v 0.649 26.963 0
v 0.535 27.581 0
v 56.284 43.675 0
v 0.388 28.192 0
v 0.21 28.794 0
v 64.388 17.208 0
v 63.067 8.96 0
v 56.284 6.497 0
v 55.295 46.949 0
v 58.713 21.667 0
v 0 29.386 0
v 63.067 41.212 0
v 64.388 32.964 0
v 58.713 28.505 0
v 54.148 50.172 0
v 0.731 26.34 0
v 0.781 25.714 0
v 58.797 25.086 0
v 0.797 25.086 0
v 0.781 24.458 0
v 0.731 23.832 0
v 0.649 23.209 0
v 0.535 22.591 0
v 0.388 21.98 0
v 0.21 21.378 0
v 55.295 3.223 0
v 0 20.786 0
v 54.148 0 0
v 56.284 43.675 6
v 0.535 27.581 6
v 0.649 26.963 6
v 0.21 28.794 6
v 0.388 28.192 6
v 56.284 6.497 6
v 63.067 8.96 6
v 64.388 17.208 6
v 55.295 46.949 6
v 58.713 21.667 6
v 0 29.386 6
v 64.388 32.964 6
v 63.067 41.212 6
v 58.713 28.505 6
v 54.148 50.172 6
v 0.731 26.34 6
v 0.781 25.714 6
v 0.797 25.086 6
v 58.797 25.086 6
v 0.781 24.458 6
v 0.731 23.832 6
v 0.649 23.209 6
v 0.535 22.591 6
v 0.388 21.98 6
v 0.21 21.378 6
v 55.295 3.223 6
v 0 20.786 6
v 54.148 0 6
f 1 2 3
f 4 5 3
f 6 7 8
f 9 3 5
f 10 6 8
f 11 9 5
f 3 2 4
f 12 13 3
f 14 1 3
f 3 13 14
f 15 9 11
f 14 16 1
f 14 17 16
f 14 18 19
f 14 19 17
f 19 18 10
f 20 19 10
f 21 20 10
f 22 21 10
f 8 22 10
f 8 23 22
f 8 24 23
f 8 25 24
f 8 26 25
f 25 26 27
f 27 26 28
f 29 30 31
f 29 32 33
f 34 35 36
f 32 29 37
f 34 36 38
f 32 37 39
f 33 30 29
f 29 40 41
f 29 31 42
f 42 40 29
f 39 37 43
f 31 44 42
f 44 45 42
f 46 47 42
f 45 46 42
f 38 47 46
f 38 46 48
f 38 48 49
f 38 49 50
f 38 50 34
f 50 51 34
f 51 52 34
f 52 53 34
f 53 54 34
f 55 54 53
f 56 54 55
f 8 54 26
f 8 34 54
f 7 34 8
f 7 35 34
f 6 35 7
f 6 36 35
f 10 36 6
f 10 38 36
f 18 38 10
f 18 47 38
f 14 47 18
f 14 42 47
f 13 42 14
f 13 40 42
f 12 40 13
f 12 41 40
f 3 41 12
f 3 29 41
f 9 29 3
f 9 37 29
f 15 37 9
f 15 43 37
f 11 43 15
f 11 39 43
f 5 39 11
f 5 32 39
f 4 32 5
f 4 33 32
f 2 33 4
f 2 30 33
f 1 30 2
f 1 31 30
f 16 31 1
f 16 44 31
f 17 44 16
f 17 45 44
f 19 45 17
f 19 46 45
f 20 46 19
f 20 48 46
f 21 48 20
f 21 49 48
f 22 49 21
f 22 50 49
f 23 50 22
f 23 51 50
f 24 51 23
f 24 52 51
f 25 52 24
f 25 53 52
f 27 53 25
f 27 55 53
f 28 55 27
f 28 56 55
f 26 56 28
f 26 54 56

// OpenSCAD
$fn = 32;

// ----------------------------------------------------------------------
// Gear sector: 2 teeth on 42 degrees
// ----------------------------------------------------------------------

// --- parameters (mm) ---
sector_angle = 42;        // sector angle, degrees
root_r = 70;              // root circle radius
tooth_h = 6;              // tooth height over the root circle
teeth = 2;                // number of teeth on the sector
hub_r = 12;               // hub bore radius
plate_t = 6;              // sector thickness, Z
arc_step = 3;             // sampling step of the root/hub arcs, degrees
fit_tol = 0.1;            // declared fit tolerance (prompt contract)
free_tol = 0.5;           // declared free tolerance (prompt contract)

tip_r = root_r + tooth_h;  // tip circle radius

profile = [[54.148, 0], [55.295, 3.223], [56.284, 6.497], [63.067, 8.96], [64.388, 17.208], [58.713, 21.667], [58.797, 25.086], [58.713, 28.505], [64.388, 32.964], [63.067, 41.212], [56.284, 43.675], [55.295, 46.949], [54.148, 50.172], [0, 29.386], [0.21, 28.794], [0.388, 28.192], [0.535, 27.581], [0.649, 26.963], [0.731, 26.34], [0.781, 25.714], [0.797, 25.086], [0.781, 24.458], [0.731, 23.832], [0.649, 23.209], [0.535, 22.591], [0.388, 21.98], [0.21, 21.378], [0, 20.786]];  // primary outline, 28 points, counter clockwise

// --- the one profile operation ---
linear_extrude(height = plate_t) polygon(points = profile);
